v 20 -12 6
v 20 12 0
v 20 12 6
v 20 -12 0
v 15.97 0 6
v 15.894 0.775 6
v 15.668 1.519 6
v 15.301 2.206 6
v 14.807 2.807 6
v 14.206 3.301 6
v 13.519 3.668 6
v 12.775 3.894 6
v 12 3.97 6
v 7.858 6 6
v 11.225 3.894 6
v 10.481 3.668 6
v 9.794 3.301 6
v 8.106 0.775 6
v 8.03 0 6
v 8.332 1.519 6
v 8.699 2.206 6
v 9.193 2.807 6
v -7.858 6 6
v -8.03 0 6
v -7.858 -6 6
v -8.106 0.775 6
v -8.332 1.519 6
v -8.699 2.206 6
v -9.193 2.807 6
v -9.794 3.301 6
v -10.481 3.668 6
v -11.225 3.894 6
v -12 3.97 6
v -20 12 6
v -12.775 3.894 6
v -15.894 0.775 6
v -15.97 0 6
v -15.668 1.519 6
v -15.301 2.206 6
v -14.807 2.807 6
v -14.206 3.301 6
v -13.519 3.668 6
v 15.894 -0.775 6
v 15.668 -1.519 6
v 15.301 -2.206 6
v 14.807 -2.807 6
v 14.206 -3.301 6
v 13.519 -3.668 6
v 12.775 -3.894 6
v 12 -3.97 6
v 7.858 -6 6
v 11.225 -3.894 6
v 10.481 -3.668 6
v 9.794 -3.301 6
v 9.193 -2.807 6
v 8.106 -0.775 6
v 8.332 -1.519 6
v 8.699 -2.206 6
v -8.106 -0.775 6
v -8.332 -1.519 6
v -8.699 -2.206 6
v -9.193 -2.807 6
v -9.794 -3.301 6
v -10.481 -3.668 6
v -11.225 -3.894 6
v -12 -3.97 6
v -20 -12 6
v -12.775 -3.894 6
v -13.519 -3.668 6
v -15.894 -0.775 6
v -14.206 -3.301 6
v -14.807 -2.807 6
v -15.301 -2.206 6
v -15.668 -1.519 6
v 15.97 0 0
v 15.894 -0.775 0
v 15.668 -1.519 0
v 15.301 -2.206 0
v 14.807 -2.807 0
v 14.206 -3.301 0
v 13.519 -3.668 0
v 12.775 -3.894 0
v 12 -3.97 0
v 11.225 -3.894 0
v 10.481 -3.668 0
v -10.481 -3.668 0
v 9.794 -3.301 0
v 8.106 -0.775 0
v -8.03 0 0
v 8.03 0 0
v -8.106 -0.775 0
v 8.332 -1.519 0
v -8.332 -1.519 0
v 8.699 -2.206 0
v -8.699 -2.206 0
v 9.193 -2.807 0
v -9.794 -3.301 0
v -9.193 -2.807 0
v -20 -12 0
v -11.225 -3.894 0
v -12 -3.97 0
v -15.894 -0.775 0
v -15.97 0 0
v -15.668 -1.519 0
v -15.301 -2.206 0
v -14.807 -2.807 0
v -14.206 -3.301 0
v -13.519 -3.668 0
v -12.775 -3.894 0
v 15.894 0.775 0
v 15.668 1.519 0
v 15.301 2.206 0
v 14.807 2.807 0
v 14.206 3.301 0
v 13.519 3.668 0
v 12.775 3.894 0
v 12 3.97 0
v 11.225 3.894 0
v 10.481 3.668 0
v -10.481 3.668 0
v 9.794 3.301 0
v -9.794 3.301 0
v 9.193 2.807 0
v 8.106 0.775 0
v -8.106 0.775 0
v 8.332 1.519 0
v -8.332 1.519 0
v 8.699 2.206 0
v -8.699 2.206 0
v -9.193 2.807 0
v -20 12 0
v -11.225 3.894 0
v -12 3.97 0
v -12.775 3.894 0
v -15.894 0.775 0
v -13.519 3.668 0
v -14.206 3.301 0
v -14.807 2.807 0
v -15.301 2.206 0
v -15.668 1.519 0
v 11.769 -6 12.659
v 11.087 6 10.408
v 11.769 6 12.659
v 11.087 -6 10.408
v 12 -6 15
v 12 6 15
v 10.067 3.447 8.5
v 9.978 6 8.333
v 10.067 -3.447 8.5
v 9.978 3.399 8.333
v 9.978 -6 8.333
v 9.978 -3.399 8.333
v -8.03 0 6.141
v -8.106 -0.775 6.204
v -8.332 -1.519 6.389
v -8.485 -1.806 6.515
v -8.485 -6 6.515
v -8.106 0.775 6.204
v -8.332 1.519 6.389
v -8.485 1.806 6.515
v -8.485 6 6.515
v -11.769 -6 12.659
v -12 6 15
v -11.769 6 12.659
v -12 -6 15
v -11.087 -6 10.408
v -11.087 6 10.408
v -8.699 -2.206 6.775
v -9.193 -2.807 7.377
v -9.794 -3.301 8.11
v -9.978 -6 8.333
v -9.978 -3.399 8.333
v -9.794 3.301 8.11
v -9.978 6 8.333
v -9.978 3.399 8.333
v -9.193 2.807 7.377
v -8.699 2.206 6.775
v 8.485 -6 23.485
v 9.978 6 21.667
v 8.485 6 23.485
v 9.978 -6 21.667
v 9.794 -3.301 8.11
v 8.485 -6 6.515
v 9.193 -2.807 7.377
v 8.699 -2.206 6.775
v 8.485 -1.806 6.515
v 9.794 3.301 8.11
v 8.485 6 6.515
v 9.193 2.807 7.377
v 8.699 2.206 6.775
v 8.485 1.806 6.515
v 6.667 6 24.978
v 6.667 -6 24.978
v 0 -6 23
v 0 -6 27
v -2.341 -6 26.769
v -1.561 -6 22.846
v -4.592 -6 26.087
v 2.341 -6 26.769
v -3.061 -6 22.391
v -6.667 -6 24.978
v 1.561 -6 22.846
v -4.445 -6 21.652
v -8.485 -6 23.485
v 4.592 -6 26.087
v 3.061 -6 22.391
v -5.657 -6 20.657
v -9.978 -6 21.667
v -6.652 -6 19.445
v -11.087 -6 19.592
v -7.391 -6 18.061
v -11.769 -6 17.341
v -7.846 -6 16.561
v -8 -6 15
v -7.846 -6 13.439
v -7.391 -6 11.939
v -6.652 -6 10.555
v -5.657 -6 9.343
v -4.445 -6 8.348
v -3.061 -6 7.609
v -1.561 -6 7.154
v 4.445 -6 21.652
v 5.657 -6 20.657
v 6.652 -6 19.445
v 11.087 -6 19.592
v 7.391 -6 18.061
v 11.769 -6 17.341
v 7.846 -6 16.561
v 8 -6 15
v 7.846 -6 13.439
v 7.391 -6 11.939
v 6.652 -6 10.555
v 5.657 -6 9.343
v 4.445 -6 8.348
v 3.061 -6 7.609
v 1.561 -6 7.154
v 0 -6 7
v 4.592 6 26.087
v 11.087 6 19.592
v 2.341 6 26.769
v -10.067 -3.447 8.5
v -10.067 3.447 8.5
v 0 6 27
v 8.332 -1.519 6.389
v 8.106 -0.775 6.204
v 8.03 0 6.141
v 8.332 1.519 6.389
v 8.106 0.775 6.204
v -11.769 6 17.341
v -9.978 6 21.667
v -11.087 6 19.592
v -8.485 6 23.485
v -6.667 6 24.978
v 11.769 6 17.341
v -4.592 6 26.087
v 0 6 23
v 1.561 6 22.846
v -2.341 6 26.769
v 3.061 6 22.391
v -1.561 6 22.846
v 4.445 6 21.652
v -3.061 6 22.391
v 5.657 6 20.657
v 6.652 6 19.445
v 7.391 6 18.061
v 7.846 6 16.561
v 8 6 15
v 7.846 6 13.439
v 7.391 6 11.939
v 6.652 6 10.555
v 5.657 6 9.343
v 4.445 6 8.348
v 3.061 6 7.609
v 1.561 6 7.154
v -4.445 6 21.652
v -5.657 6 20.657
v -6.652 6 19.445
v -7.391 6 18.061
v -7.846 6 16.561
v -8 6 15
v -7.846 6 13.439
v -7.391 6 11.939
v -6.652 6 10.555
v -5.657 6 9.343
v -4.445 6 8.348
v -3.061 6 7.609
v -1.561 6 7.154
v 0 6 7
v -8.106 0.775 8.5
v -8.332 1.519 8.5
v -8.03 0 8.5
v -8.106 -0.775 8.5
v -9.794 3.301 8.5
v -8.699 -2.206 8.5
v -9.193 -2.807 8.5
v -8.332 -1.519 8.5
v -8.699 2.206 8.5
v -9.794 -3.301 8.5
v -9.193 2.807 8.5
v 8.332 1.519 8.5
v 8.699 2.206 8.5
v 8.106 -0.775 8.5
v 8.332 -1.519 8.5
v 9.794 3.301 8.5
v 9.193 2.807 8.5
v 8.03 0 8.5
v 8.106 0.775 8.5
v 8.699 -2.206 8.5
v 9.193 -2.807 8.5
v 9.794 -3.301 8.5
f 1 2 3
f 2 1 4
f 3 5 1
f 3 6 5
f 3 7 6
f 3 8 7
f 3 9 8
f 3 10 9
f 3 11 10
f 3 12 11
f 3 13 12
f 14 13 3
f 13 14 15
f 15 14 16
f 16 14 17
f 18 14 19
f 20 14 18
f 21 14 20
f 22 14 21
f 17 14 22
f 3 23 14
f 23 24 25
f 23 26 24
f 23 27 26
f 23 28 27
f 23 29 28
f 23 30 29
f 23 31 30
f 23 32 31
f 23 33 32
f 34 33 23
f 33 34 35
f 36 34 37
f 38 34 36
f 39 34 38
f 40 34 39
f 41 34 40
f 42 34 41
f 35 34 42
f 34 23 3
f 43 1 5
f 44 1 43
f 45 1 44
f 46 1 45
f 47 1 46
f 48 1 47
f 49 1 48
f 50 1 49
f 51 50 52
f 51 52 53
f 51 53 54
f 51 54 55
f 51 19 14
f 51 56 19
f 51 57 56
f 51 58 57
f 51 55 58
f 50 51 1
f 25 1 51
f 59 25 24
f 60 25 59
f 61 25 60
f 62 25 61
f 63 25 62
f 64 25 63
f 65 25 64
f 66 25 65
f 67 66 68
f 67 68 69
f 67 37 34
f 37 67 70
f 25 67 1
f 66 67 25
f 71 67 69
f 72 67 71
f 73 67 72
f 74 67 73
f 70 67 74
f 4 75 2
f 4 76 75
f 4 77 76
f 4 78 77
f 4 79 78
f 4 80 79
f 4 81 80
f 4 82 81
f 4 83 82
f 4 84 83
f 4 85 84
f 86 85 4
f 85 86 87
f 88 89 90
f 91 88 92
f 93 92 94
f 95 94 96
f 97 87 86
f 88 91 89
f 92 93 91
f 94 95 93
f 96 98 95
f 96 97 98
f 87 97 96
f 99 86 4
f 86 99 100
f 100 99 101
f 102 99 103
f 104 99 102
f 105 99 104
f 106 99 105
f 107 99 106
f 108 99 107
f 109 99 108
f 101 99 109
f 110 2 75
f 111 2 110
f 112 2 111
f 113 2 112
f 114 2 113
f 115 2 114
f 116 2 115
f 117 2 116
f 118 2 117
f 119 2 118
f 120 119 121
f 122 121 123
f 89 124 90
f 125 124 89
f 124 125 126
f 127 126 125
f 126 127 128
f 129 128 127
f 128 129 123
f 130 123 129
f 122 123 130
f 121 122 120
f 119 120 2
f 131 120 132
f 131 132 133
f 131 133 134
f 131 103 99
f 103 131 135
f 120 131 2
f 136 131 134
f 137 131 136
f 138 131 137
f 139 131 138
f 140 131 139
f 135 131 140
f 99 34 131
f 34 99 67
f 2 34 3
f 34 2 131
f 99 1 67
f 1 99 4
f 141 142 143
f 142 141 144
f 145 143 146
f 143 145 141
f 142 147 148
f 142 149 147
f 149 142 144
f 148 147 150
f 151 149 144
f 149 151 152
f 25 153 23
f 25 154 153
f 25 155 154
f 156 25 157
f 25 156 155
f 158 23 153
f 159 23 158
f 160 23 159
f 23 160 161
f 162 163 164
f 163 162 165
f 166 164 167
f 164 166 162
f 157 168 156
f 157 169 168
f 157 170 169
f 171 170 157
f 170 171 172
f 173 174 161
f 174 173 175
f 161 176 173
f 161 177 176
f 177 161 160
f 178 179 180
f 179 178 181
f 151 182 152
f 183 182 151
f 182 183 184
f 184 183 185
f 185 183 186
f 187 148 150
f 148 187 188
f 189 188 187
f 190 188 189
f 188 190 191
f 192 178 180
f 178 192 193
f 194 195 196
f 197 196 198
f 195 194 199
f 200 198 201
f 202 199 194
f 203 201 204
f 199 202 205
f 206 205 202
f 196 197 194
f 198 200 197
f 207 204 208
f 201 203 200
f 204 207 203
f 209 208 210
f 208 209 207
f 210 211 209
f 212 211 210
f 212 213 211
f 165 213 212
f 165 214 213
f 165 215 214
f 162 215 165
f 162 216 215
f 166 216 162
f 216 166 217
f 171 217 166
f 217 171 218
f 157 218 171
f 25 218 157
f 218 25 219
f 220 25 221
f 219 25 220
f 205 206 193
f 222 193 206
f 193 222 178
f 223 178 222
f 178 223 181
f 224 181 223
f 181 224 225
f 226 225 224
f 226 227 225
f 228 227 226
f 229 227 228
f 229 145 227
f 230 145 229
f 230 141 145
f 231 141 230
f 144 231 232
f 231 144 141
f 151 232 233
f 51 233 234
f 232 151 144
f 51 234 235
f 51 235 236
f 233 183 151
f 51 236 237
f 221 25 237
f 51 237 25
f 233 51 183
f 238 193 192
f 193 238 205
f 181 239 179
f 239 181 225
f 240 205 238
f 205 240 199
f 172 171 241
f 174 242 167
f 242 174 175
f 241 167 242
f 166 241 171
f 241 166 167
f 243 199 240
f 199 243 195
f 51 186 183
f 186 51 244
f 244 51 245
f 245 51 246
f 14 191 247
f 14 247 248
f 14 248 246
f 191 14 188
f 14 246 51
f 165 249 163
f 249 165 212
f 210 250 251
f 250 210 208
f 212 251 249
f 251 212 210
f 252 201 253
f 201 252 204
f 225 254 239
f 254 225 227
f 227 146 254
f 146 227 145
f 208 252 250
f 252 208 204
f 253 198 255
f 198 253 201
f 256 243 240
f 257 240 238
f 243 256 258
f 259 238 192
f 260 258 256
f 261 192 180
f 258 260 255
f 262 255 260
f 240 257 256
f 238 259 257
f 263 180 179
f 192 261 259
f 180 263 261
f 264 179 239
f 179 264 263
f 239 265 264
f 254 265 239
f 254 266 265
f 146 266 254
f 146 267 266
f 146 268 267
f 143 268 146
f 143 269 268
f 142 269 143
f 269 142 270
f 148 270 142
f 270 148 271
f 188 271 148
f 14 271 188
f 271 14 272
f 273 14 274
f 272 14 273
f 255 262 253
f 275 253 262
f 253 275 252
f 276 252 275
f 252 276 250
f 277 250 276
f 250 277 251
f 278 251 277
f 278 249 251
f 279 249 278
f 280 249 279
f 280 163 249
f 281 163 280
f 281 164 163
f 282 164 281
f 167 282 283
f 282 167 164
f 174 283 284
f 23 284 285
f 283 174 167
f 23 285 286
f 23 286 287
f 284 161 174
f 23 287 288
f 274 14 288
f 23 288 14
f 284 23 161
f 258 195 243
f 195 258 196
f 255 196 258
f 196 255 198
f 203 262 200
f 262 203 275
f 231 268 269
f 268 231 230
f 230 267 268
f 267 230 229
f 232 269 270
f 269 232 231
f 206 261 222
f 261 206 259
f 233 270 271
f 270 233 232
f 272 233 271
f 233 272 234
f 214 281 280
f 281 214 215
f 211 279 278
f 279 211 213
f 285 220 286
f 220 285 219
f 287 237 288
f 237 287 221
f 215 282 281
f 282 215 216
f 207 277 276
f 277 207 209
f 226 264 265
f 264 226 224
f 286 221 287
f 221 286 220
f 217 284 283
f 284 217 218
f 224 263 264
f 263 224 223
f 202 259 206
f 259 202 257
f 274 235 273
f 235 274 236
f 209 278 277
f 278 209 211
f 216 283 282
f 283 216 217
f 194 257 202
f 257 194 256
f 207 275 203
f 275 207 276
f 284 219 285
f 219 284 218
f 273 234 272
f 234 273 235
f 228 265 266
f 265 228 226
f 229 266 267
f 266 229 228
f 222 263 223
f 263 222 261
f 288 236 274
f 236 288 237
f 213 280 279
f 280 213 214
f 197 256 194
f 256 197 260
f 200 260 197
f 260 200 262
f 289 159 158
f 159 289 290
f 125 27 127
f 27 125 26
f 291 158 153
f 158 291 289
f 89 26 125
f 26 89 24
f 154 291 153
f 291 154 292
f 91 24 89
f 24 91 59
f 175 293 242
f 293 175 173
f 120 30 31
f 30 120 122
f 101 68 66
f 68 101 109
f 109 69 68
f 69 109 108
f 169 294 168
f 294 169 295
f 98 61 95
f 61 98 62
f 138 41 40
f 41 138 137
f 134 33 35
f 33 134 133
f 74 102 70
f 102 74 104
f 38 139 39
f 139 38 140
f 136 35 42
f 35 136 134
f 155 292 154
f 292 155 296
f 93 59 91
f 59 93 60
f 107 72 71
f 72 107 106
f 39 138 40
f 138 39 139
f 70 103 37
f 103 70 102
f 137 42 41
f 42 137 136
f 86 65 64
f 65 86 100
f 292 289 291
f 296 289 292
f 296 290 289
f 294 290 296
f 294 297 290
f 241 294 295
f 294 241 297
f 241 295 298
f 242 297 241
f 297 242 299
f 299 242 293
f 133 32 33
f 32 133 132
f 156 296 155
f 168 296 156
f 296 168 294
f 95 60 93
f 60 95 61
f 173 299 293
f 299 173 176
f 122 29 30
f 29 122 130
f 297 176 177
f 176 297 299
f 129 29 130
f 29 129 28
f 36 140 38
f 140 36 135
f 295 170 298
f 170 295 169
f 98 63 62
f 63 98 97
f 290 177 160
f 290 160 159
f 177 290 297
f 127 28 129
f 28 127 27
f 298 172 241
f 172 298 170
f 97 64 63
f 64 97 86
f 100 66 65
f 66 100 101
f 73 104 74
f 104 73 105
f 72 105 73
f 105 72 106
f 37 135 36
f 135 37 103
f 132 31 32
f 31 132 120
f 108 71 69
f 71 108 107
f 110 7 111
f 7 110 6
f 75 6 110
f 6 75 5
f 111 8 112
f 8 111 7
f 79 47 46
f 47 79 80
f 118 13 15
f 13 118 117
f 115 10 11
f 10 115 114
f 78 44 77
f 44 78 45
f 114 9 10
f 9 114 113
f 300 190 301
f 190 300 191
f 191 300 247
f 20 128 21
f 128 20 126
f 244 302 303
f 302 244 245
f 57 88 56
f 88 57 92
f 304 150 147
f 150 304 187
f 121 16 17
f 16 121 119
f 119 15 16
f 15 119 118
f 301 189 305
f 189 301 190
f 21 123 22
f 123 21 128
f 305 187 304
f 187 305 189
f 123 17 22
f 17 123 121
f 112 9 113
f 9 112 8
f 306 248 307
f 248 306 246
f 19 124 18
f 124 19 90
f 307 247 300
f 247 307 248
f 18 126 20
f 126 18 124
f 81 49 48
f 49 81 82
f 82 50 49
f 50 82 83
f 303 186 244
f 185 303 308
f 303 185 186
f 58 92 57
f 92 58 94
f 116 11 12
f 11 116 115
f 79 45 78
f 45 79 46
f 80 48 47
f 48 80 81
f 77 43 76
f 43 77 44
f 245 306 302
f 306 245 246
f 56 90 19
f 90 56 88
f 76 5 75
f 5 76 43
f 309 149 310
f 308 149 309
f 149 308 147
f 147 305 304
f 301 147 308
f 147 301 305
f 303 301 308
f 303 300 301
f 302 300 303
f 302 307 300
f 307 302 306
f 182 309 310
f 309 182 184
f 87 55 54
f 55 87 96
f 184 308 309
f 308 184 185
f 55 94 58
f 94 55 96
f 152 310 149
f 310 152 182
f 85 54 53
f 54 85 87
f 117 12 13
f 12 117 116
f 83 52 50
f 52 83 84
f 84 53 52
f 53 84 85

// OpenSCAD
$fn = 32;

// ----------------------------------------------------------------------
// Deck eye: 24 mm eye on a 40 mm base
// ----------------------------------------------------------------------

// --- parameters (mm) ---
base_l = 40;              // base length
base_w = 24;              // base width
base_t = 6;               // base thickness
eye_r = 12;               // eye outside radius
eye_bore = 16;            // eye bore diameter
eye_w = 12;               // eye thickness
eye_z = 15;               // eye centre height
holes_d = 7.94;           // fixing holes
hole_x = 12;              // fixing hole spacing

difference() {
  union() {
    translate([-20, -12, 0]) cube([base_l, base_w, base_t]);
    /* eye standing upright, its foot sunk 3 mm into the base */
    translate([0, -6, 15]) rotate([-90, 0, 0]) cylinder(h = 12, d = 24);
  }
  /* eye bore, 2.5 mm clear of both faces */
  translate([0, -8.5, 15]) rotate([-90, 0, 0]) cylinder(h = 17, d = 16);
  translate([-12, 0, -2.5]) cylinder(h = base_t + 5, d = holes_d);
  translate([12, 0, -2.5]) cylinder(h = base_t + 5, d = holes_d);
}
